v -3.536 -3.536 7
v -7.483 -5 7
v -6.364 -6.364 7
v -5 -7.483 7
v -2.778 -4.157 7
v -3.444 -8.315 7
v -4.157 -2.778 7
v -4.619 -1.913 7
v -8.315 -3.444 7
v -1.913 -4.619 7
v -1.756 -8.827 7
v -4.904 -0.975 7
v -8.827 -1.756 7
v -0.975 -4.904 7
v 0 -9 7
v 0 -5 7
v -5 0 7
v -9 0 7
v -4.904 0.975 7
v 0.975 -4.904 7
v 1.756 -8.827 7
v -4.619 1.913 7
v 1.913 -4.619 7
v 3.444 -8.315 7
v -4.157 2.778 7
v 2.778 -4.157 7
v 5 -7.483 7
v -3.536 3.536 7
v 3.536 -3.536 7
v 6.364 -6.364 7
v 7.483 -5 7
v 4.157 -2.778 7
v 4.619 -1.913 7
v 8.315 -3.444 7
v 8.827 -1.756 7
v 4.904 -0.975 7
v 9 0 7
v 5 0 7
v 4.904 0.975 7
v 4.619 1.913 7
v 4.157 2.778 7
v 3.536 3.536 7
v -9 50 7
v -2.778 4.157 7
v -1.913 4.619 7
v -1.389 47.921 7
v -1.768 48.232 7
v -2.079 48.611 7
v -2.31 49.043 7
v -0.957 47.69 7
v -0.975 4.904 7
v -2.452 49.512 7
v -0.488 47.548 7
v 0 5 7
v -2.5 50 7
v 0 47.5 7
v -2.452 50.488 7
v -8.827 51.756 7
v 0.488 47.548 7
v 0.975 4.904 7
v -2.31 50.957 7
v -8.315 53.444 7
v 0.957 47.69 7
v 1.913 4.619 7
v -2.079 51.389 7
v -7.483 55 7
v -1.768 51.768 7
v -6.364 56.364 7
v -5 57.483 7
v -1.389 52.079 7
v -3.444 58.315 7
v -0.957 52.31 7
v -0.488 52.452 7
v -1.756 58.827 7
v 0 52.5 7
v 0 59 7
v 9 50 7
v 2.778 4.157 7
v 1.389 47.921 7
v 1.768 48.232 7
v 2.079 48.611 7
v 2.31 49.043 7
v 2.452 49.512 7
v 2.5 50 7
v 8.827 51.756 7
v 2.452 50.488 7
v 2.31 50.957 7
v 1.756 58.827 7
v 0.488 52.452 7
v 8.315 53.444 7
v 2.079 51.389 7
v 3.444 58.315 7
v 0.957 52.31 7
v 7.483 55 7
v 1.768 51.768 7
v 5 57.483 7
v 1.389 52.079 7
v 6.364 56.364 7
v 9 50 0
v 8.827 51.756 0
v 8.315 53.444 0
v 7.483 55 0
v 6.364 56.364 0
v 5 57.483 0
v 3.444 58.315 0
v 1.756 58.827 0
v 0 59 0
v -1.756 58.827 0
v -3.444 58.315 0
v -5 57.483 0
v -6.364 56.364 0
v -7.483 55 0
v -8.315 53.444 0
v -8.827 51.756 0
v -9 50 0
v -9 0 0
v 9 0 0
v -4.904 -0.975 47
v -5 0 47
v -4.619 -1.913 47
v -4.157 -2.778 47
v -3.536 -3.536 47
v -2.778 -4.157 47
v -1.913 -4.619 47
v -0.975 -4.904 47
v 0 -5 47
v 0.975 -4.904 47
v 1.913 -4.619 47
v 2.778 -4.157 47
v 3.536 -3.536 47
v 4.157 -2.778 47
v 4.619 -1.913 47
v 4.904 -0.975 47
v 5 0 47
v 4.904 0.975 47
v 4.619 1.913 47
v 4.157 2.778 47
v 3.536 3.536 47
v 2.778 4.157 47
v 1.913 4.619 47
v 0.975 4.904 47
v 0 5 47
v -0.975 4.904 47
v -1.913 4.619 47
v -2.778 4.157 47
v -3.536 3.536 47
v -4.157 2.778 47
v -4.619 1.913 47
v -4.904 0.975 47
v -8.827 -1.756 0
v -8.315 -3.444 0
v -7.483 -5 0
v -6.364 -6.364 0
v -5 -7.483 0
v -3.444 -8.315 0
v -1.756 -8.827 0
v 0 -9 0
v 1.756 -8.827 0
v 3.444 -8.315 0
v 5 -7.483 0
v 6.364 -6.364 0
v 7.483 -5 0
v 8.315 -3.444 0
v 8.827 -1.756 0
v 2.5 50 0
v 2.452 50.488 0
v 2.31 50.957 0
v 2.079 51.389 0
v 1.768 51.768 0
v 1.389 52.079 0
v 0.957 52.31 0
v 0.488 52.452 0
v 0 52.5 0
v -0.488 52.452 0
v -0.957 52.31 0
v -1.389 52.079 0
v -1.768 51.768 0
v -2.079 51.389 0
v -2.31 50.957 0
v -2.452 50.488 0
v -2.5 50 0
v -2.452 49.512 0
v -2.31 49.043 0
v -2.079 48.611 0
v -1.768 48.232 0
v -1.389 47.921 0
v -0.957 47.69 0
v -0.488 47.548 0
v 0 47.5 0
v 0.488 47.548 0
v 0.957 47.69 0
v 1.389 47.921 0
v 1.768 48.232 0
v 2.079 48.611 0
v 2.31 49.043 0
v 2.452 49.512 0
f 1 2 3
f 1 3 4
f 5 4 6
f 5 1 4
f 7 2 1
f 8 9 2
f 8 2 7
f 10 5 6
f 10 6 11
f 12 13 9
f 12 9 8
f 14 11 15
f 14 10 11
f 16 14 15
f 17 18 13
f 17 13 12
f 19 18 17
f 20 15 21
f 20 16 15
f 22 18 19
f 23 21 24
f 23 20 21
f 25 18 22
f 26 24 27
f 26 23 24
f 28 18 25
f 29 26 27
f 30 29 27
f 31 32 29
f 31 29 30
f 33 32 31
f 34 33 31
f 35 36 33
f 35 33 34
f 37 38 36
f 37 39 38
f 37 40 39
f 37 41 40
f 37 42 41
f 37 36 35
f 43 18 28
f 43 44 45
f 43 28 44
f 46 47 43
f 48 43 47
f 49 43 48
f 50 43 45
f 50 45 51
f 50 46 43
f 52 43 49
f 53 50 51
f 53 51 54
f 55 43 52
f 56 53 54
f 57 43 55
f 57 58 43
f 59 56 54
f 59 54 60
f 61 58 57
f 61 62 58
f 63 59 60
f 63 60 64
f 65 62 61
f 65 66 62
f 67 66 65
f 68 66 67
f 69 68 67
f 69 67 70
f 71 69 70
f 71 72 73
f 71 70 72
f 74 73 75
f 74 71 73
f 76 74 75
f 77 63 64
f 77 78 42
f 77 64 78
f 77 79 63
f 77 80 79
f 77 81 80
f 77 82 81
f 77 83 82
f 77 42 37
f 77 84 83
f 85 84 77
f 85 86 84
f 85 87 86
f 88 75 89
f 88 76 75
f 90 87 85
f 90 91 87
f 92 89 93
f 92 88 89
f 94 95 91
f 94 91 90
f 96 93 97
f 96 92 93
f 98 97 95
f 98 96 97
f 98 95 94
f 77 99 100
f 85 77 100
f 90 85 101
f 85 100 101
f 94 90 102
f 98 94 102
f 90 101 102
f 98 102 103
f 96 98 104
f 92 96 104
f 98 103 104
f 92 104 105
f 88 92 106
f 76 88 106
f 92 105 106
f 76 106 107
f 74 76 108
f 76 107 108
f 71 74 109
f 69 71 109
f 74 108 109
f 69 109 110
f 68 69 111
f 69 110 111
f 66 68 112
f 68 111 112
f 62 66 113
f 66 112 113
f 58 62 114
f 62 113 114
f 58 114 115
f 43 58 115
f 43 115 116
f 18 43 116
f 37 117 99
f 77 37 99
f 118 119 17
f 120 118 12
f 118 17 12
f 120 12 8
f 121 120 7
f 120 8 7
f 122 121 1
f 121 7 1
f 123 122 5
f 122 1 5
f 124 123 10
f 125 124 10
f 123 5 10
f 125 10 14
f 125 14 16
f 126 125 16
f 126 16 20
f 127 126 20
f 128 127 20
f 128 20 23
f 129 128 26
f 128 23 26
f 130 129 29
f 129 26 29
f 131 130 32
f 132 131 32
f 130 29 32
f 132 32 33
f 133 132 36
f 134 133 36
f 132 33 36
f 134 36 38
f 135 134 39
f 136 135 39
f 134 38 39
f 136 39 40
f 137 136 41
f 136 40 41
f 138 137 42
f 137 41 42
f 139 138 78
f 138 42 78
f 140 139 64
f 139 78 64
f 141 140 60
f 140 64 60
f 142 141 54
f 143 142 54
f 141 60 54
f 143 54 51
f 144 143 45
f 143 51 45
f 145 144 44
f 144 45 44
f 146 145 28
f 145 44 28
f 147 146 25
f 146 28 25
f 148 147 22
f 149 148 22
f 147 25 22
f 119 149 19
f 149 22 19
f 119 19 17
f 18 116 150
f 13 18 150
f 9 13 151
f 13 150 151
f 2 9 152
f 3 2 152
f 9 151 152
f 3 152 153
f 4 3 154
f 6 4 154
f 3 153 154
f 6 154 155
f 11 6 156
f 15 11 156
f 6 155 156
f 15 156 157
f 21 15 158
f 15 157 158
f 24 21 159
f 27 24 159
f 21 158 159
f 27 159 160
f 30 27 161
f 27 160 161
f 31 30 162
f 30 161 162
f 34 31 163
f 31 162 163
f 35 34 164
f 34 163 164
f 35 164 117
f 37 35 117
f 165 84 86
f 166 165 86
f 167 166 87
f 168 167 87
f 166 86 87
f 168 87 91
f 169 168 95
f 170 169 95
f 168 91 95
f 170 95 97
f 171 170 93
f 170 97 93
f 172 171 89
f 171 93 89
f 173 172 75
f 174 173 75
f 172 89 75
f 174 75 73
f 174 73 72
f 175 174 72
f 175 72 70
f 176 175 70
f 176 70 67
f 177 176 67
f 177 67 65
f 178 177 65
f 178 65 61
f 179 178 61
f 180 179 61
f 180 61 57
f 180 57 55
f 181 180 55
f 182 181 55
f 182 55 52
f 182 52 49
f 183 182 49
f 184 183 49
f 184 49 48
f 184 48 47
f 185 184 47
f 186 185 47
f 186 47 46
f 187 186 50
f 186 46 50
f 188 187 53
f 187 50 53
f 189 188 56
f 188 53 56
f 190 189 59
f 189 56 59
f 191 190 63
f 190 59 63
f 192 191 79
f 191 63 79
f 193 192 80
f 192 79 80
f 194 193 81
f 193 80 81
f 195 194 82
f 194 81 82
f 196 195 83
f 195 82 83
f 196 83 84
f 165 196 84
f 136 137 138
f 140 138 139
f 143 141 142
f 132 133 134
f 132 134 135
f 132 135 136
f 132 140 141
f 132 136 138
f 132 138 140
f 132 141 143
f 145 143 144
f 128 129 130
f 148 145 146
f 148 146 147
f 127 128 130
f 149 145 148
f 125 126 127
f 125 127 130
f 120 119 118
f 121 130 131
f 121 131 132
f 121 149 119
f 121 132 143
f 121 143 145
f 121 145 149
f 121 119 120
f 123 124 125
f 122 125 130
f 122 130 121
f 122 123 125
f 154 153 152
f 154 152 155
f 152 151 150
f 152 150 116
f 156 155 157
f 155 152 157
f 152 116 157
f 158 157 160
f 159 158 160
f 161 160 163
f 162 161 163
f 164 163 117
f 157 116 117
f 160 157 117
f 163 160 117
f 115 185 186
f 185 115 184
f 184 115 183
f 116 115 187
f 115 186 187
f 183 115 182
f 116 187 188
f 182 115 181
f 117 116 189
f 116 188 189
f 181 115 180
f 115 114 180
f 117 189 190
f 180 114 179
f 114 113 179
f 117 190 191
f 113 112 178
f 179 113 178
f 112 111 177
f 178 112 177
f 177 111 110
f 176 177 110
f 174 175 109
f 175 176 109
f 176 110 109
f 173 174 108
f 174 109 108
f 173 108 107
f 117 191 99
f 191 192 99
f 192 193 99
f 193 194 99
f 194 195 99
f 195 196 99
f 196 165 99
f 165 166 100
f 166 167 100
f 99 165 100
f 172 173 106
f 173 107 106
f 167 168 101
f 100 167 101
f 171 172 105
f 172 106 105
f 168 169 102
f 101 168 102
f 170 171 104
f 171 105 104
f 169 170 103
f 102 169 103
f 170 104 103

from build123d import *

# Parameters (mm, degrees)
BOSS_EXTRUDE1_DEPTH   = 7
SKETCH2_R             = 5
BOSS_EXTRUDE2_DEPTH   = 40
M6_TAPPED_HOLE1_D     = 5
M6_TAPPED_HOLE1_DEPTH = 15
M6_TAPPED_HOLE1_TIP   = 1.502151548


with BuildPart() as part:
    # Sketch1 → Boss-Extrude1 (new body)
    with BuildSketch(Plane.XY):
        with BuildLine():
            Line((-9, 50), (-9, 0))
            ThreePointArc((-9, 0), (0, -9), (9, 0))
            Line((9, 0), (9, 50))
            ThreePointArc((9, 50), (0, 59), (-9, 50))
        make_face()
    extrude(amount=BOSS_EXTRUDE1_DEPTH)

    # Sketch2 → Boss-Extrude2 (add)
    with BuildSketch(Plane.XY.offset(7)):
        with Locations(Location((0, 0, 0), (0, 0, 180))):  # turned: the seam where the file's is
            Circle(SKETCH2_R)
    extrude(amount=BOSS_EXTRUDE2_DEPTH)

    # M6 Tapped Hole1
    with Locations(Plane(origin=(0, 0, 0), x_dir=(-1, 0, 0), z_dir=(0, 0, -1))):
        with Locations((0, 50)):
            Hole(M6_TAPPED_HOLE1_D / 2, depth=M6_TAPPED_HOLE1_DEPTH)
            with Locations((0, 0, -(M6_TAPPED_HOLE1_DEPTH + M6_TAPPED_HOLE1_TIP / 2))):  # 118° drill point
                Cone(0, M6_TAPPED_HOLE1_D / 2, M6_TAPPED_HOLE1_TIP, mode=Mode.SUBTRACT)


solid = part.part
